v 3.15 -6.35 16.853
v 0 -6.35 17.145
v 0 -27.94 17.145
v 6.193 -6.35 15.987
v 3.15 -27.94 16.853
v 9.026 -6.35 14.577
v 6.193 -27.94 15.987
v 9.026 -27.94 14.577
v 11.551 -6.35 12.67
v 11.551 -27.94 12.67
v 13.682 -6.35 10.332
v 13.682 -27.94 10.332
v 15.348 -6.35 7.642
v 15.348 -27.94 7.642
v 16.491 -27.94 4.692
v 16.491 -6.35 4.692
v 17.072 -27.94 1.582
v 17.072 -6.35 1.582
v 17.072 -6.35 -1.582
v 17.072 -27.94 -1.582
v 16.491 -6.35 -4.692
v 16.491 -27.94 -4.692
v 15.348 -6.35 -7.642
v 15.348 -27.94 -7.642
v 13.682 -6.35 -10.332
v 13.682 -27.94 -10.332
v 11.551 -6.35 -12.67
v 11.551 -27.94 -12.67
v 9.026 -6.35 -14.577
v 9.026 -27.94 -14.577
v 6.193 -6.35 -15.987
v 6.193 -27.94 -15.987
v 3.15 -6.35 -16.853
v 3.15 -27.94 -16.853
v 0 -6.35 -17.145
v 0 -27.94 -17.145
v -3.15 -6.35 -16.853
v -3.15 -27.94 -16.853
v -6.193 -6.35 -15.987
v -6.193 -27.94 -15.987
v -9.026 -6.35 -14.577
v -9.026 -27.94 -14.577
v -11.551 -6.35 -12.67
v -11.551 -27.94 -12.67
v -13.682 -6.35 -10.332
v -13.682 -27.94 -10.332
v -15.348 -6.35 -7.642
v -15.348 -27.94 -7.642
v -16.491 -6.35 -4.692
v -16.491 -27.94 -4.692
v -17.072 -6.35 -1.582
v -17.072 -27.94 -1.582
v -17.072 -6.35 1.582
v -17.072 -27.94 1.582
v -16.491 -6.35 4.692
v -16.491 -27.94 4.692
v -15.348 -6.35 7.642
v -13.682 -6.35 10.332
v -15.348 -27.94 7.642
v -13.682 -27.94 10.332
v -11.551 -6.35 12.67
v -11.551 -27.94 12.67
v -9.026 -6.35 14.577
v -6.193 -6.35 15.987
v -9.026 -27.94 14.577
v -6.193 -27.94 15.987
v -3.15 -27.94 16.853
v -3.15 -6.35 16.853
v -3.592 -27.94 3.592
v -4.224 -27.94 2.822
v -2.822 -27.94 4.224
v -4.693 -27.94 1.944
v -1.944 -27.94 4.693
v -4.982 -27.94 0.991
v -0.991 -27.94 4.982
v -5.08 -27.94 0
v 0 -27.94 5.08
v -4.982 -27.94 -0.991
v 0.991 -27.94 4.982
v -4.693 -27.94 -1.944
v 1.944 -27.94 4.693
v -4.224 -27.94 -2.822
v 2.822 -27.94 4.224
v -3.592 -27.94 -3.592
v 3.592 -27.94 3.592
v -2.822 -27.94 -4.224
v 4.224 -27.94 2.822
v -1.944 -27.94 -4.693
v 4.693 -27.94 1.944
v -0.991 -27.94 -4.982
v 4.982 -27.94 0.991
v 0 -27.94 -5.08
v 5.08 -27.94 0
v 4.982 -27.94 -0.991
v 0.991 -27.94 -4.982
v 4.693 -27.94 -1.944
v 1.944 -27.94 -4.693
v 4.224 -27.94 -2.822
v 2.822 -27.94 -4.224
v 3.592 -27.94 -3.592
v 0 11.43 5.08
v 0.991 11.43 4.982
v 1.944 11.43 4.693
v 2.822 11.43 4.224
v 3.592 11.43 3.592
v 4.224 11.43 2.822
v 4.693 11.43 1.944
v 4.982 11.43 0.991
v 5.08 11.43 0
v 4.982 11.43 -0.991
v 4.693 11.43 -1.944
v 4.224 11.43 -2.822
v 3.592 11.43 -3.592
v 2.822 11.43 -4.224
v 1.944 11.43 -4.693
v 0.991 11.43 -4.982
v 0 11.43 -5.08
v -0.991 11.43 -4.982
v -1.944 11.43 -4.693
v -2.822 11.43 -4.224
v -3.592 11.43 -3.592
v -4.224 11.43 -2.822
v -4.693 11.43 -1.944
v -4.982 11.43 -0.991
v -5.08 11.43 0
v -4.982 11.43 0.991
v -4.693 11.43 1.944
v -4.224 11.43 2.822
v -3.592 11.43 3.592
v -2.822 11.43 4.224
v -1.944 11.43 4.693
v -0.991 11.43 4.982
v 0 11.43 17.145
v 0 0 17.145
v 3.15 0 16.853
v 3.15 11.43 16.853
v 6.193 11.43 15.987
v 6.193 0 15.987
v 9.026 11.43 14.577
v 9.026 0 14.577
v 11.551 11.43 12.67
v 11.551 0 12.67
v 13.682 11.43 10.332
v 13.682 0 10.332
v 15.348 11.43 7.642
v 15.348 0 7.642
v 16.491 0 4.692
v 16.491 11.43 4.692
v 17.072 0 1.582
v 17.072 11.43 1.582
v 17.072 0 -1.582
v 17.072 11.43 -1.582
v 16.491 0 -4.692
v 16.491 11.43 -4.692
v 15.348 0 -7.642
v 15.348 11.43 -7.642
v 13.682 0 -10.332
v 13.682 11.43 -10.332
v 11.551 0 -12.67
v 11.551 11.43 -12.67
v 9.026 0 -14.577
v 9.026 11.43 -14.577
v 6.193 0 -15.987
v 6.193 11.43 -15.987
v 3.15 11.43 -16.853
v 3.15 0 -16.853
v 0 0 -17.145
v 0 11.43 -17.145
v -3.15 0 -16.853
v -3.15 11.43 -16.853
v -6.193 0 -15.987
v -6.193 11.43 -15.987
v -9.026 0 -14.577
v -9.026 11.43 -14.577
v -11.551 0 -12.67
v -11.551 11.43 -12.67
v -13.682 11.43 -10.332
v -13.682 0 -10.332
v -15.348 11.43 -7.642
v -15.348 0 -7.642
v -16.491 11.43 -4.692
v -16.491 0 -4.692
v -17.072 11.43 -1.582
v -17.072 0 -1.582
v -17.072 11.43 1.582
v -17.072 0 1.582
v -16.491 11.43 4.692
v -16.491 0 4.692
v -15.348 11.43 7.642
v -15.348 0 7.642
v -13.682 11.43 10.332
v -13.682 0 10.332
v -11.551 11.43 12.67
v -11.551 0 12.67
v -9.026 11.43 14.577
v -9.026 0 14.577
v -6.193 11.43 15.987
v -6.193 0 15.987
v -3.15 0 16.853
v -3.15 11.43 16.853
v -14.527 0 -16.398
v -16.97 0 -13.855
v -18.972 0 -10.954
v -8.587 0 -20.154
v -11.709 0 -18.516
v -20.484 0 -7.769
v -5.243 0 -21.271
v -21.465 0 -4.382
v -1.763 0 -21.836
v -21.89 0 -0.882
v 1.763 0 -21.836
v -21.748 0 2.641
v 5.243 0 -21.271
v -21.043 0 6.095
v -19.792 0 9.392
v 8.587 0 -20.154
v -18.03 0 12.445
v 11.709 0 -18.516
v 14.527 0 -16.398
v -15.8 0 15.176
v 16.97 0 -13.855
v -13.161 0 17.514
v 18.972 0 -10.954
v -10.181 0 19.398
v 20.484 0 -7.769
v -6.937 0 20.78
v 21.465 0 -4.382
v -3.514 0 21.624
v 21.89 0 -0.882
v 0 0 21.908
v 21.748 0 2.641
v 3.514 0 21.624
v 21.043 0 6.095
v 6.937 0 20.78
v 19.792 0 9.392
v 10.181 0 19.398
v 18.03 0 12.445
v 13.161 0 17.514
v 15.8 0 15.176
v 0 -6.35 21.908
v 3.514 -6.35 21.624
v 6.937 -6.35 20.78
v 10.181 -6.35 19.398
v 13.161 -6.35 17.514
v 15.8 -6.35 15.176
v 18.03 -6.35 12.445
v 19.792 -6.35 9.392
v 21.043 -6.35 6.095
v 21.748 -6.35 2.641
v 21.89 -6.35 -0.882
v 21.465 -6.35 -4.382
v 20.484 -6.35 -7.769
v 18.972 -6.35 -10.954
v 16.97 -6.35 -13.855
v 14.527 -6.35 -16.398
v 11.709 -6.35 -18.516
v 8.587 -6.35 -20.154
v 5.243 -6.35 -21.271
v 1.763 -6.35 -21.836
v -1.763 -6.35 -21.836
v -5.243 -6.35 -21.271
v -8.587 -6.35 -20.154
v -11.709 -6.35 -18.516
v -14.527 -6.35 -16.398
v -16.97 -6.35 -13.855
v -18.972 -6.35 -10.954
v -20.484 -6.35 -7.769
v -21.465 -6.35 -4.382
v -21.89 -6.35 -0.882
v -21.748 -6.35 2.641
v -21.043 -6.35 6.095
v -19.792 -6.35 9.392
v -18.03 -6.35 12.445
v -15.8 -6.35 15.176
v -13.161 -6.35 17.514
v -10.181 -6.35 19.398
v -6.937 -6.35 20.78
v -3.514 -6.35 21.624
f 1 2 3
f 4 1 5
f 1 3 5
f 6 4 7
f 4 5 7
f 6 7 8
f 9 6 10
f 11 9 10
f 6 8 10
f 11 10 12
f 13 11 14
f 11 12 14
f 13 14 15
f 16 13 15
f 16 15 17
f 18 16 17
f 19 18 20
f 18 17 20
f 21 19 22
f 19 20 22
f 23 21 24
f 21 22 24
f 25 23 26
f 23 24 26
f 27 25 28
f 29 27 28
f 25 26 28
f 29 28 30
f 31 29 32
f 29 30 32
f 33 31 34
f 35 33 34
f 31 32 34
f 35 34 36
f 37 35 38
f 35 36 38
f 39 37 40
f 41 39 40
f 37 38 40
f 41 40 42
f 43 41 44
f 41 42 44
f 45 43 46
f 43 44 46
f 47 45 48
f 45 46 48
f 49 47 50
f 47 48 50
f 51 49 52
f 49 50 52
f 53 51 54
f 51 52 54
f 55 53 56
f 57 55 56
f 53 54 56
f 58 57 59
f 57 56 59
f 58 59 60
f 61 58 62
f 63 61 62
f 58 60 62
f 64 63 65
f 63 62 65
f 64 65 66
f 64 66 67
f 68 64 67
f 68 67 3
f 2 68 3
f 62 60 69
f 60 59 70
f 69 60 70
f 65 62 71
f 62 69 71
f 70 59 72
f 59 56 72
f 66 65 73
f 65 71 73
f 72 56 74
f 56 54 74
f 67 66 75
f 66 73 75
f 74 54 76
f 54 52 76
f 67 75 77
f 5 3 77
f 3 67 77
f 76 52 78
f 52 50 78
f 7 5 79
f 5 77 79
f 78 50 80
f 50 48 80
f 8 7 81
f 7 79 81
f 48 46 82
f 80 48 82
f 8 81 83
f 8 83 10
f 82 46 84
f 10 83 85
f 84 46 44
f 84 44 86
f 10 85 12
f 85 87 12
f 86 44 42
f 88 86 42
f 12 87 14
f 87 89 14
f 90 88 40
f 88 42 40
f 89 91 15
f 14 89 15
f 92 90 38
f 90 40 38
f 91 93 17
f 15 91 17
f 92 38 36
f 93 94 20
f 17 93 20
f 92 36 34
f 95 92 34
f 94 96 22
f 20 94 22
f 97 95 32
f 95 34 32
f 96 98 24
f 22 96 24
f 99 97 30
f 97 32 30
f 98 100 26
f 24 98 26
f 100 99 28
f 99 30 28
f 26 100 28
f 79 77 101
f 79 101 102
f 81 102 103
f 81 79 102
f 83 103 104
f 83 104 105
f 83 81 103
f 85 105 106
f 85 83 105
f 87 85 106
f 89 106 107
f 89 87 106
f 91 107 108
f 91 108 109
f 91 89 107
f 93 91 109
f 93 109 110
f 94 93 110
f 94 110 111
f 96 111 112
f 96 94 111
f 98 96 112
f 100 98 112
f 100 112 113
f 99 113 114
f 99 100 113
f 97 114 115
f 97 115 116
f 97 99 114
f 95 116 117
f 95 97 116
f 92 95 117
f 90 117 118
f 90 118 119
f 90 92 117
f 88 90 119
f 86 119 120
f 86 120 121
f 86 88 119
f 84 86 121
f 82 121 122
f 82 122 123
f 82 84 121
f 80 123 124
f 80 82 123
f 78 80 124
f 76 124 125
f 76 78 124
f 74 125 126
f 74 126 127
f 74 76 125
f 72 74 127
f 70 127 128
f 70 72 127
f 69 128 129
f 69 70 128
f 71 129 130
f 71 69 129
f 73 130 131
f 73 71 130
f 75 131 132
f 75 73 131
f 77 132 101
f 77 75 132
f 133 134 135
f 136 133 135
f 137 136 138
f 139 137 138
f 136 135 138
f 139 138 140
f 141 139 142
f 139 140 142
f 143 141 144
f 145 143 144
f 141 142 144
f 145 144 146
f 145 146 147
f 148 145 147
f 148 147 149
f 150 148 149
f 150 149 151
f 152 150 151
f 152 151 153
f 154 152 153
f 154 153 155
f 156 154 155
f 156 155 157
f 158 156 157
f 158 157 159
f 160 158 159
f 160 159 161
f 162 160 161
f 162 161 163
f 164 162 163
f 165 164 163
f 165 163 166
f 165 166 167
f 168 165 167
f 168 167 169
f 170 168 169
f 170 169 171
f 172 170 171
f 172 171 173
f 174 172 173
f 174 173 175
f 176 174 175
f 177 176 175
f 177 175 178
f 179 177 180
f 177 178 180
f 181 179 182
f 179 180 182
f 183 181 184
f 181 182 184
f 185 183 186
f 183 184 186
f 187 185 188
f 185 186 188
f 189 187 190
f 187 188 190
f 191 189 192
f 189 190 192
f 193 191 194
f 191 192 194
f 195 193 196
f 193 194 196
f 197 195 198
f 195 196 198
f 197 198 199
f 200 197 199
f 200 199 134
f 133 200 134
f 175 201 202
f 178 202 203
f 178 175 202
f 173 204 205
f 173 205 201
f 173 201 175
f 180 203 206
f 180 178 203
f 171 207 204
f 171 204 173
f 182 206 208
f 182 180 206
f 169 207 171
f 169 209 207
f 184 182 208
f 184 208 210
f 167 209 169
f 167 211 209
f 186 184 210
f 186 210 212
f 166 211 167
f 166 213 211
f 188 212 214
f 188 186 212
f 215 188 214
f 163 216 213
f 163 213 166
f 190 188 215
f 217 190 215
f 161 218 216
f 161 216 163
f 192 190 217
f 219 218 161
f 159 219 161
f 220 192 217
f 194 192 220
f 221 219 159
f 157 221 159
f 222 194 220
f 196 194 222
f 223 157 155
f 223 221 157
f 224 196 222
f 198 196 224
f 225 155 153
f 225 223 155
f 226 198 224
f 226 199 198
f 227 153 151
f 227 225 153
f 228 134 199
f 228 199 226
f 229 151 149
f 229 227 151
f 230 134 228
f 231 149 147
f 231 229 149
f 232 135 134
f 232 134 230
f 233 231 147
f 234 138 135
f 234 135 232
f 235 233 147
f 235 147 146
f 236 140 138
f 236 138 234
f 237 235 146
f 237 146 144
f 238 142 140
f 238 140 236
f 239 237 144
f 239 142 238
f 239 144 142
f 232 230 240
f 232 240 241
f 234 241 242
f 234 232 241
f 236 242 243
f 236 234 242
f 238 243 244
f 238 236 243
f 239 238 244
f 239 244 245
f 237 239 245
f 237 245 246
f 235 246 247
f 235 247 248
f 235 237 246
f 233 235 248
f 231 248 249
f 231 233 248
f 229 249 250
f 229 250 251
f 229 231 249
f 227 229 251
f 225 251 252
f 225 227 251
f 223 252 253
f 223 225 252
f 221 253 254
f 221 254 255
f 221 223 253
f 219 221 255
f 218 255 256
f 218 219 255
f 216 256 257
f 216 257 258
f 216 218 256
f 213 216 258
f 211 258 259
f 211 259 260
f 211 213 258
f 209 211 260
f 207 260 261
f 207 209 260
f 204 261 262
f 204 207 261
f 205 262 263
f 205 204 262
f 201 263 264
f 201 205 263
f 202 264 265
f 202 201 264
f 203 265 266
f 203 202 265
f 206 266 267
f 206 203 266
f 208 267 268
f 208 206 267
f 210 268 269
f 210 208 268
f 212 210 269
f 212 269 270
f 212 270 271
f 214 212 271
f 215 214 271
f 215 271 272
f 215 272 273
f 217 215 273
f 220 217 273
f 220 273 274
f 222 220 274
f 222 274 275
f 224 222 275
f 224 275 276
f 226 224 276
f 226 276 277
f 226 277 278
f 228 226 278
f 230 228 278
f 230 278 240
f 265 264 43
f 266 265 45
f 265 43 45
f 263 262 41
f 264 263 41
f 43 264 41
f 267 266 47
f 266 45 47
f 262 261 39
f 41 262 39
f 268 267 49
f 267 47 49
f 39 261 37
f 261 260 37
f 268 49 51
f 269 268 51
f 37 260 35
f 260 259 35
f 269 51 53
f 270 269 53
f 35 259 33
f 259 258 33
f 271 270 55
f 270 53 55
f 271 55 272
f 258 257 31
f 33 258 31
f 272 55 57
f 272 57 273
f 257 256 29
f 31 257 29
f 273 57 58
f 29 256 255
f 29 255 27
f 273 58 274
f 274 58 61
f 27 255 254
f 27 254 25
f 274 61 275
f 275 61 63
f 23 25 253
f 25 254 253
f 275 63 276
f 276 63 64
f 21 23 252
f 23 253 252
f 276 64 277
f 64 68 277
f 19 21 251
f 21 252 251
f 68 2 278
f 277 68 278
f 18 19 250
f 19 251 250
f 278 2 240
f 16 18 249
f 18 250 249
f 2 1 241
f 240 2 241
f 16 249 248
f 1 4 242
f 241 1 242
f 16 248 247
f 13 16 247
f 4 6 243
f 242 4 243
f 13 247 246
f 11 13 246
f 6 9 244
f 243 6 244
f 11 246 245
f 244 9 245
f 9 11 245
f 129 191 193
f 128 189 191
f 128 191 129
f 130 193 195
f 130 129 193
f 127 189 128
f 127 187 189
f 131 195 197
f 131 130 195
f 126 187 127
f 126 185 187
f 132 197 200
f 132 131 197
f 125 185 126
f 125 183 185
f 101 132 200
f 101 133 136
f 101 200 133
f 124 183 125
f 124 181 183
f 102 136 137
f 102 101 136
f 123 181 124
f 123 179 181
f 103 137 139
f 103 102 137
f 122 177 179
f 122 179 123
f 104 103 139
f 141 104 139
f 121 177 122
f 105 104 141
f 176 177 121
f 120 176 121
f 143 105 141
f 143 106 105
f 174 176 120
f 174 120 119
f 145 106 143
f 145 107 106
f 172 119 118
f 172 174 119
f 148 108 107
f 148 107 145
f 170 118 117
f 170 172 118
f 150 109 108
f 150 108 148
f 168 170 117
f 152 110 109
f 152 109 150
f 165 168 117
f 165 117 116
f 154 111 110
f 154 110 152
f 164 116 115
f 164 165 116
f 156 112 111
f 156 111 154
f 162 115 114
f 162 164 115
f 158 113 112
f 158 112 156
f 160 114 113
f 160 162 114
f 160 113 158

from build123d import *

# Parameters (mm, degrees)
BOSS_EXTRUDE1_DEPTH      = 11.43
BOSS_EXTRUDE1_DEPTH_BACK = 11.43
SKETCH1_R                = 17.145
SKETCH1_3_R              = 21.9075
SKETCH1_3_R_2            = 17.145
BOSS_EXTRUDE2_DEPTH      = 6.35
SKETCH1_4_R              = 17.145
BOSS_EXTRUDE3_DEPTH      = 27.94
CUT_EXTRUDE2_DEPTH       = 51.098642821
CUT_EXTRUDE2_DEPTH_BACK  = 51.098642821
SKETCH2_R                = 10.16
BOSS_EXTRUDE4_START      = -39.37
SKETCH3_R                = 10.16
SKETCH3_R_2              = 5.08
BOSS_EXTRUDE4_DEPTH      = 39.37


with BuildPart() as part:
    # Sketch1 → Boss-Extrude1 (new, two sides: drawn at the far end of the back side and taken through both)
    with BuildSketch(Plane(origin=(0, 0, 0), x_dir=(1, 0, 0), z_dir=(0, 1, 0)).offset(-BOSS_EXTRUDE1_DEPTH_BACK)):
        with Locations(Location((0, 0, 0), (0, 0, 270))):
            Circle(SKETCH1_R)
    extrude(amount=BOSS_EXTRUDE1_DEPTH + BOSS_EXTRUDE1_DEPTH_BACK)



with BuildPart() as body_2:
    # Sketch1<3> → Boss-Extrude2 (new body)
    with BuildSketch(Plane(origin=(0, 0, 0), x_dir=(1, 0, 0), z_dir=(0, 1, 0))):
        with Locations(Location((0, 0, 0), (0, 0, 270))):
            Circle(SKETCH1_3_R)
        with Locations(Location((0, 0, 0), (0, 0, 270))):
            Circle(SKETCH1_3_R_2, mode=Mode.SUBTRACT)
    extrude(amount=-BOSS_EXTRUDE2_DEPTH)


with BuildPart() as part_1:
    add(part.part)

    add(body_2.part)  # Boss-Extrude3 merges body 2
    # Sketch1<4> → Boss-Extrude3 (add)
    with BuildSketch(Plane(origin=(0, 0, 0), x_dir=(1, 0, 0), z_dir=(0, 1, 0))):
        with Locations(Location((0, 0, 0), (0, 0, 270))):
            Circle(SKETCH1_4_R)
    extrude(amount=-BOSS_EXTRUDE3_DEPTH)

    # Sketch2 → Cut-Extrude2 (cut, two sides: drawn at the far end of the back side and taken through both)
    with BuildSketch(Plane.XZ.offset(27.94).offset(-CUT_EXTRUDE2_DEPTH_BACK)):
        with Locations(Location((0, 0, 0), (0, 0, 270))):
            Circle(SKETCH2_R)
    extrude(amount=CUT_EXTRUDE2_DEPTH + CUT_EXTRUDE2_DEPTH_BACK, mode=Mode.SUBTRACT)

    # Sketch3 → Boss-Extrude4 (add)
    with BuildSketch(Plane(origin=(0, 11.43, 0), x_dir=(1, 0, 0), z_dir=(0, 1, 0)).offset(BOSS_EXTRUDE4_START)):
        Circle(SKETCH3_R)
        with Locations(Location((0, 0, 0), (0, 0, 270))):
            Circle(SKETCH3_R_2, mode=Mode.SUBTRACT)
    extrude(amount=BOSS_EXTRUDE4_DEPTH)


solid = part_1.part
